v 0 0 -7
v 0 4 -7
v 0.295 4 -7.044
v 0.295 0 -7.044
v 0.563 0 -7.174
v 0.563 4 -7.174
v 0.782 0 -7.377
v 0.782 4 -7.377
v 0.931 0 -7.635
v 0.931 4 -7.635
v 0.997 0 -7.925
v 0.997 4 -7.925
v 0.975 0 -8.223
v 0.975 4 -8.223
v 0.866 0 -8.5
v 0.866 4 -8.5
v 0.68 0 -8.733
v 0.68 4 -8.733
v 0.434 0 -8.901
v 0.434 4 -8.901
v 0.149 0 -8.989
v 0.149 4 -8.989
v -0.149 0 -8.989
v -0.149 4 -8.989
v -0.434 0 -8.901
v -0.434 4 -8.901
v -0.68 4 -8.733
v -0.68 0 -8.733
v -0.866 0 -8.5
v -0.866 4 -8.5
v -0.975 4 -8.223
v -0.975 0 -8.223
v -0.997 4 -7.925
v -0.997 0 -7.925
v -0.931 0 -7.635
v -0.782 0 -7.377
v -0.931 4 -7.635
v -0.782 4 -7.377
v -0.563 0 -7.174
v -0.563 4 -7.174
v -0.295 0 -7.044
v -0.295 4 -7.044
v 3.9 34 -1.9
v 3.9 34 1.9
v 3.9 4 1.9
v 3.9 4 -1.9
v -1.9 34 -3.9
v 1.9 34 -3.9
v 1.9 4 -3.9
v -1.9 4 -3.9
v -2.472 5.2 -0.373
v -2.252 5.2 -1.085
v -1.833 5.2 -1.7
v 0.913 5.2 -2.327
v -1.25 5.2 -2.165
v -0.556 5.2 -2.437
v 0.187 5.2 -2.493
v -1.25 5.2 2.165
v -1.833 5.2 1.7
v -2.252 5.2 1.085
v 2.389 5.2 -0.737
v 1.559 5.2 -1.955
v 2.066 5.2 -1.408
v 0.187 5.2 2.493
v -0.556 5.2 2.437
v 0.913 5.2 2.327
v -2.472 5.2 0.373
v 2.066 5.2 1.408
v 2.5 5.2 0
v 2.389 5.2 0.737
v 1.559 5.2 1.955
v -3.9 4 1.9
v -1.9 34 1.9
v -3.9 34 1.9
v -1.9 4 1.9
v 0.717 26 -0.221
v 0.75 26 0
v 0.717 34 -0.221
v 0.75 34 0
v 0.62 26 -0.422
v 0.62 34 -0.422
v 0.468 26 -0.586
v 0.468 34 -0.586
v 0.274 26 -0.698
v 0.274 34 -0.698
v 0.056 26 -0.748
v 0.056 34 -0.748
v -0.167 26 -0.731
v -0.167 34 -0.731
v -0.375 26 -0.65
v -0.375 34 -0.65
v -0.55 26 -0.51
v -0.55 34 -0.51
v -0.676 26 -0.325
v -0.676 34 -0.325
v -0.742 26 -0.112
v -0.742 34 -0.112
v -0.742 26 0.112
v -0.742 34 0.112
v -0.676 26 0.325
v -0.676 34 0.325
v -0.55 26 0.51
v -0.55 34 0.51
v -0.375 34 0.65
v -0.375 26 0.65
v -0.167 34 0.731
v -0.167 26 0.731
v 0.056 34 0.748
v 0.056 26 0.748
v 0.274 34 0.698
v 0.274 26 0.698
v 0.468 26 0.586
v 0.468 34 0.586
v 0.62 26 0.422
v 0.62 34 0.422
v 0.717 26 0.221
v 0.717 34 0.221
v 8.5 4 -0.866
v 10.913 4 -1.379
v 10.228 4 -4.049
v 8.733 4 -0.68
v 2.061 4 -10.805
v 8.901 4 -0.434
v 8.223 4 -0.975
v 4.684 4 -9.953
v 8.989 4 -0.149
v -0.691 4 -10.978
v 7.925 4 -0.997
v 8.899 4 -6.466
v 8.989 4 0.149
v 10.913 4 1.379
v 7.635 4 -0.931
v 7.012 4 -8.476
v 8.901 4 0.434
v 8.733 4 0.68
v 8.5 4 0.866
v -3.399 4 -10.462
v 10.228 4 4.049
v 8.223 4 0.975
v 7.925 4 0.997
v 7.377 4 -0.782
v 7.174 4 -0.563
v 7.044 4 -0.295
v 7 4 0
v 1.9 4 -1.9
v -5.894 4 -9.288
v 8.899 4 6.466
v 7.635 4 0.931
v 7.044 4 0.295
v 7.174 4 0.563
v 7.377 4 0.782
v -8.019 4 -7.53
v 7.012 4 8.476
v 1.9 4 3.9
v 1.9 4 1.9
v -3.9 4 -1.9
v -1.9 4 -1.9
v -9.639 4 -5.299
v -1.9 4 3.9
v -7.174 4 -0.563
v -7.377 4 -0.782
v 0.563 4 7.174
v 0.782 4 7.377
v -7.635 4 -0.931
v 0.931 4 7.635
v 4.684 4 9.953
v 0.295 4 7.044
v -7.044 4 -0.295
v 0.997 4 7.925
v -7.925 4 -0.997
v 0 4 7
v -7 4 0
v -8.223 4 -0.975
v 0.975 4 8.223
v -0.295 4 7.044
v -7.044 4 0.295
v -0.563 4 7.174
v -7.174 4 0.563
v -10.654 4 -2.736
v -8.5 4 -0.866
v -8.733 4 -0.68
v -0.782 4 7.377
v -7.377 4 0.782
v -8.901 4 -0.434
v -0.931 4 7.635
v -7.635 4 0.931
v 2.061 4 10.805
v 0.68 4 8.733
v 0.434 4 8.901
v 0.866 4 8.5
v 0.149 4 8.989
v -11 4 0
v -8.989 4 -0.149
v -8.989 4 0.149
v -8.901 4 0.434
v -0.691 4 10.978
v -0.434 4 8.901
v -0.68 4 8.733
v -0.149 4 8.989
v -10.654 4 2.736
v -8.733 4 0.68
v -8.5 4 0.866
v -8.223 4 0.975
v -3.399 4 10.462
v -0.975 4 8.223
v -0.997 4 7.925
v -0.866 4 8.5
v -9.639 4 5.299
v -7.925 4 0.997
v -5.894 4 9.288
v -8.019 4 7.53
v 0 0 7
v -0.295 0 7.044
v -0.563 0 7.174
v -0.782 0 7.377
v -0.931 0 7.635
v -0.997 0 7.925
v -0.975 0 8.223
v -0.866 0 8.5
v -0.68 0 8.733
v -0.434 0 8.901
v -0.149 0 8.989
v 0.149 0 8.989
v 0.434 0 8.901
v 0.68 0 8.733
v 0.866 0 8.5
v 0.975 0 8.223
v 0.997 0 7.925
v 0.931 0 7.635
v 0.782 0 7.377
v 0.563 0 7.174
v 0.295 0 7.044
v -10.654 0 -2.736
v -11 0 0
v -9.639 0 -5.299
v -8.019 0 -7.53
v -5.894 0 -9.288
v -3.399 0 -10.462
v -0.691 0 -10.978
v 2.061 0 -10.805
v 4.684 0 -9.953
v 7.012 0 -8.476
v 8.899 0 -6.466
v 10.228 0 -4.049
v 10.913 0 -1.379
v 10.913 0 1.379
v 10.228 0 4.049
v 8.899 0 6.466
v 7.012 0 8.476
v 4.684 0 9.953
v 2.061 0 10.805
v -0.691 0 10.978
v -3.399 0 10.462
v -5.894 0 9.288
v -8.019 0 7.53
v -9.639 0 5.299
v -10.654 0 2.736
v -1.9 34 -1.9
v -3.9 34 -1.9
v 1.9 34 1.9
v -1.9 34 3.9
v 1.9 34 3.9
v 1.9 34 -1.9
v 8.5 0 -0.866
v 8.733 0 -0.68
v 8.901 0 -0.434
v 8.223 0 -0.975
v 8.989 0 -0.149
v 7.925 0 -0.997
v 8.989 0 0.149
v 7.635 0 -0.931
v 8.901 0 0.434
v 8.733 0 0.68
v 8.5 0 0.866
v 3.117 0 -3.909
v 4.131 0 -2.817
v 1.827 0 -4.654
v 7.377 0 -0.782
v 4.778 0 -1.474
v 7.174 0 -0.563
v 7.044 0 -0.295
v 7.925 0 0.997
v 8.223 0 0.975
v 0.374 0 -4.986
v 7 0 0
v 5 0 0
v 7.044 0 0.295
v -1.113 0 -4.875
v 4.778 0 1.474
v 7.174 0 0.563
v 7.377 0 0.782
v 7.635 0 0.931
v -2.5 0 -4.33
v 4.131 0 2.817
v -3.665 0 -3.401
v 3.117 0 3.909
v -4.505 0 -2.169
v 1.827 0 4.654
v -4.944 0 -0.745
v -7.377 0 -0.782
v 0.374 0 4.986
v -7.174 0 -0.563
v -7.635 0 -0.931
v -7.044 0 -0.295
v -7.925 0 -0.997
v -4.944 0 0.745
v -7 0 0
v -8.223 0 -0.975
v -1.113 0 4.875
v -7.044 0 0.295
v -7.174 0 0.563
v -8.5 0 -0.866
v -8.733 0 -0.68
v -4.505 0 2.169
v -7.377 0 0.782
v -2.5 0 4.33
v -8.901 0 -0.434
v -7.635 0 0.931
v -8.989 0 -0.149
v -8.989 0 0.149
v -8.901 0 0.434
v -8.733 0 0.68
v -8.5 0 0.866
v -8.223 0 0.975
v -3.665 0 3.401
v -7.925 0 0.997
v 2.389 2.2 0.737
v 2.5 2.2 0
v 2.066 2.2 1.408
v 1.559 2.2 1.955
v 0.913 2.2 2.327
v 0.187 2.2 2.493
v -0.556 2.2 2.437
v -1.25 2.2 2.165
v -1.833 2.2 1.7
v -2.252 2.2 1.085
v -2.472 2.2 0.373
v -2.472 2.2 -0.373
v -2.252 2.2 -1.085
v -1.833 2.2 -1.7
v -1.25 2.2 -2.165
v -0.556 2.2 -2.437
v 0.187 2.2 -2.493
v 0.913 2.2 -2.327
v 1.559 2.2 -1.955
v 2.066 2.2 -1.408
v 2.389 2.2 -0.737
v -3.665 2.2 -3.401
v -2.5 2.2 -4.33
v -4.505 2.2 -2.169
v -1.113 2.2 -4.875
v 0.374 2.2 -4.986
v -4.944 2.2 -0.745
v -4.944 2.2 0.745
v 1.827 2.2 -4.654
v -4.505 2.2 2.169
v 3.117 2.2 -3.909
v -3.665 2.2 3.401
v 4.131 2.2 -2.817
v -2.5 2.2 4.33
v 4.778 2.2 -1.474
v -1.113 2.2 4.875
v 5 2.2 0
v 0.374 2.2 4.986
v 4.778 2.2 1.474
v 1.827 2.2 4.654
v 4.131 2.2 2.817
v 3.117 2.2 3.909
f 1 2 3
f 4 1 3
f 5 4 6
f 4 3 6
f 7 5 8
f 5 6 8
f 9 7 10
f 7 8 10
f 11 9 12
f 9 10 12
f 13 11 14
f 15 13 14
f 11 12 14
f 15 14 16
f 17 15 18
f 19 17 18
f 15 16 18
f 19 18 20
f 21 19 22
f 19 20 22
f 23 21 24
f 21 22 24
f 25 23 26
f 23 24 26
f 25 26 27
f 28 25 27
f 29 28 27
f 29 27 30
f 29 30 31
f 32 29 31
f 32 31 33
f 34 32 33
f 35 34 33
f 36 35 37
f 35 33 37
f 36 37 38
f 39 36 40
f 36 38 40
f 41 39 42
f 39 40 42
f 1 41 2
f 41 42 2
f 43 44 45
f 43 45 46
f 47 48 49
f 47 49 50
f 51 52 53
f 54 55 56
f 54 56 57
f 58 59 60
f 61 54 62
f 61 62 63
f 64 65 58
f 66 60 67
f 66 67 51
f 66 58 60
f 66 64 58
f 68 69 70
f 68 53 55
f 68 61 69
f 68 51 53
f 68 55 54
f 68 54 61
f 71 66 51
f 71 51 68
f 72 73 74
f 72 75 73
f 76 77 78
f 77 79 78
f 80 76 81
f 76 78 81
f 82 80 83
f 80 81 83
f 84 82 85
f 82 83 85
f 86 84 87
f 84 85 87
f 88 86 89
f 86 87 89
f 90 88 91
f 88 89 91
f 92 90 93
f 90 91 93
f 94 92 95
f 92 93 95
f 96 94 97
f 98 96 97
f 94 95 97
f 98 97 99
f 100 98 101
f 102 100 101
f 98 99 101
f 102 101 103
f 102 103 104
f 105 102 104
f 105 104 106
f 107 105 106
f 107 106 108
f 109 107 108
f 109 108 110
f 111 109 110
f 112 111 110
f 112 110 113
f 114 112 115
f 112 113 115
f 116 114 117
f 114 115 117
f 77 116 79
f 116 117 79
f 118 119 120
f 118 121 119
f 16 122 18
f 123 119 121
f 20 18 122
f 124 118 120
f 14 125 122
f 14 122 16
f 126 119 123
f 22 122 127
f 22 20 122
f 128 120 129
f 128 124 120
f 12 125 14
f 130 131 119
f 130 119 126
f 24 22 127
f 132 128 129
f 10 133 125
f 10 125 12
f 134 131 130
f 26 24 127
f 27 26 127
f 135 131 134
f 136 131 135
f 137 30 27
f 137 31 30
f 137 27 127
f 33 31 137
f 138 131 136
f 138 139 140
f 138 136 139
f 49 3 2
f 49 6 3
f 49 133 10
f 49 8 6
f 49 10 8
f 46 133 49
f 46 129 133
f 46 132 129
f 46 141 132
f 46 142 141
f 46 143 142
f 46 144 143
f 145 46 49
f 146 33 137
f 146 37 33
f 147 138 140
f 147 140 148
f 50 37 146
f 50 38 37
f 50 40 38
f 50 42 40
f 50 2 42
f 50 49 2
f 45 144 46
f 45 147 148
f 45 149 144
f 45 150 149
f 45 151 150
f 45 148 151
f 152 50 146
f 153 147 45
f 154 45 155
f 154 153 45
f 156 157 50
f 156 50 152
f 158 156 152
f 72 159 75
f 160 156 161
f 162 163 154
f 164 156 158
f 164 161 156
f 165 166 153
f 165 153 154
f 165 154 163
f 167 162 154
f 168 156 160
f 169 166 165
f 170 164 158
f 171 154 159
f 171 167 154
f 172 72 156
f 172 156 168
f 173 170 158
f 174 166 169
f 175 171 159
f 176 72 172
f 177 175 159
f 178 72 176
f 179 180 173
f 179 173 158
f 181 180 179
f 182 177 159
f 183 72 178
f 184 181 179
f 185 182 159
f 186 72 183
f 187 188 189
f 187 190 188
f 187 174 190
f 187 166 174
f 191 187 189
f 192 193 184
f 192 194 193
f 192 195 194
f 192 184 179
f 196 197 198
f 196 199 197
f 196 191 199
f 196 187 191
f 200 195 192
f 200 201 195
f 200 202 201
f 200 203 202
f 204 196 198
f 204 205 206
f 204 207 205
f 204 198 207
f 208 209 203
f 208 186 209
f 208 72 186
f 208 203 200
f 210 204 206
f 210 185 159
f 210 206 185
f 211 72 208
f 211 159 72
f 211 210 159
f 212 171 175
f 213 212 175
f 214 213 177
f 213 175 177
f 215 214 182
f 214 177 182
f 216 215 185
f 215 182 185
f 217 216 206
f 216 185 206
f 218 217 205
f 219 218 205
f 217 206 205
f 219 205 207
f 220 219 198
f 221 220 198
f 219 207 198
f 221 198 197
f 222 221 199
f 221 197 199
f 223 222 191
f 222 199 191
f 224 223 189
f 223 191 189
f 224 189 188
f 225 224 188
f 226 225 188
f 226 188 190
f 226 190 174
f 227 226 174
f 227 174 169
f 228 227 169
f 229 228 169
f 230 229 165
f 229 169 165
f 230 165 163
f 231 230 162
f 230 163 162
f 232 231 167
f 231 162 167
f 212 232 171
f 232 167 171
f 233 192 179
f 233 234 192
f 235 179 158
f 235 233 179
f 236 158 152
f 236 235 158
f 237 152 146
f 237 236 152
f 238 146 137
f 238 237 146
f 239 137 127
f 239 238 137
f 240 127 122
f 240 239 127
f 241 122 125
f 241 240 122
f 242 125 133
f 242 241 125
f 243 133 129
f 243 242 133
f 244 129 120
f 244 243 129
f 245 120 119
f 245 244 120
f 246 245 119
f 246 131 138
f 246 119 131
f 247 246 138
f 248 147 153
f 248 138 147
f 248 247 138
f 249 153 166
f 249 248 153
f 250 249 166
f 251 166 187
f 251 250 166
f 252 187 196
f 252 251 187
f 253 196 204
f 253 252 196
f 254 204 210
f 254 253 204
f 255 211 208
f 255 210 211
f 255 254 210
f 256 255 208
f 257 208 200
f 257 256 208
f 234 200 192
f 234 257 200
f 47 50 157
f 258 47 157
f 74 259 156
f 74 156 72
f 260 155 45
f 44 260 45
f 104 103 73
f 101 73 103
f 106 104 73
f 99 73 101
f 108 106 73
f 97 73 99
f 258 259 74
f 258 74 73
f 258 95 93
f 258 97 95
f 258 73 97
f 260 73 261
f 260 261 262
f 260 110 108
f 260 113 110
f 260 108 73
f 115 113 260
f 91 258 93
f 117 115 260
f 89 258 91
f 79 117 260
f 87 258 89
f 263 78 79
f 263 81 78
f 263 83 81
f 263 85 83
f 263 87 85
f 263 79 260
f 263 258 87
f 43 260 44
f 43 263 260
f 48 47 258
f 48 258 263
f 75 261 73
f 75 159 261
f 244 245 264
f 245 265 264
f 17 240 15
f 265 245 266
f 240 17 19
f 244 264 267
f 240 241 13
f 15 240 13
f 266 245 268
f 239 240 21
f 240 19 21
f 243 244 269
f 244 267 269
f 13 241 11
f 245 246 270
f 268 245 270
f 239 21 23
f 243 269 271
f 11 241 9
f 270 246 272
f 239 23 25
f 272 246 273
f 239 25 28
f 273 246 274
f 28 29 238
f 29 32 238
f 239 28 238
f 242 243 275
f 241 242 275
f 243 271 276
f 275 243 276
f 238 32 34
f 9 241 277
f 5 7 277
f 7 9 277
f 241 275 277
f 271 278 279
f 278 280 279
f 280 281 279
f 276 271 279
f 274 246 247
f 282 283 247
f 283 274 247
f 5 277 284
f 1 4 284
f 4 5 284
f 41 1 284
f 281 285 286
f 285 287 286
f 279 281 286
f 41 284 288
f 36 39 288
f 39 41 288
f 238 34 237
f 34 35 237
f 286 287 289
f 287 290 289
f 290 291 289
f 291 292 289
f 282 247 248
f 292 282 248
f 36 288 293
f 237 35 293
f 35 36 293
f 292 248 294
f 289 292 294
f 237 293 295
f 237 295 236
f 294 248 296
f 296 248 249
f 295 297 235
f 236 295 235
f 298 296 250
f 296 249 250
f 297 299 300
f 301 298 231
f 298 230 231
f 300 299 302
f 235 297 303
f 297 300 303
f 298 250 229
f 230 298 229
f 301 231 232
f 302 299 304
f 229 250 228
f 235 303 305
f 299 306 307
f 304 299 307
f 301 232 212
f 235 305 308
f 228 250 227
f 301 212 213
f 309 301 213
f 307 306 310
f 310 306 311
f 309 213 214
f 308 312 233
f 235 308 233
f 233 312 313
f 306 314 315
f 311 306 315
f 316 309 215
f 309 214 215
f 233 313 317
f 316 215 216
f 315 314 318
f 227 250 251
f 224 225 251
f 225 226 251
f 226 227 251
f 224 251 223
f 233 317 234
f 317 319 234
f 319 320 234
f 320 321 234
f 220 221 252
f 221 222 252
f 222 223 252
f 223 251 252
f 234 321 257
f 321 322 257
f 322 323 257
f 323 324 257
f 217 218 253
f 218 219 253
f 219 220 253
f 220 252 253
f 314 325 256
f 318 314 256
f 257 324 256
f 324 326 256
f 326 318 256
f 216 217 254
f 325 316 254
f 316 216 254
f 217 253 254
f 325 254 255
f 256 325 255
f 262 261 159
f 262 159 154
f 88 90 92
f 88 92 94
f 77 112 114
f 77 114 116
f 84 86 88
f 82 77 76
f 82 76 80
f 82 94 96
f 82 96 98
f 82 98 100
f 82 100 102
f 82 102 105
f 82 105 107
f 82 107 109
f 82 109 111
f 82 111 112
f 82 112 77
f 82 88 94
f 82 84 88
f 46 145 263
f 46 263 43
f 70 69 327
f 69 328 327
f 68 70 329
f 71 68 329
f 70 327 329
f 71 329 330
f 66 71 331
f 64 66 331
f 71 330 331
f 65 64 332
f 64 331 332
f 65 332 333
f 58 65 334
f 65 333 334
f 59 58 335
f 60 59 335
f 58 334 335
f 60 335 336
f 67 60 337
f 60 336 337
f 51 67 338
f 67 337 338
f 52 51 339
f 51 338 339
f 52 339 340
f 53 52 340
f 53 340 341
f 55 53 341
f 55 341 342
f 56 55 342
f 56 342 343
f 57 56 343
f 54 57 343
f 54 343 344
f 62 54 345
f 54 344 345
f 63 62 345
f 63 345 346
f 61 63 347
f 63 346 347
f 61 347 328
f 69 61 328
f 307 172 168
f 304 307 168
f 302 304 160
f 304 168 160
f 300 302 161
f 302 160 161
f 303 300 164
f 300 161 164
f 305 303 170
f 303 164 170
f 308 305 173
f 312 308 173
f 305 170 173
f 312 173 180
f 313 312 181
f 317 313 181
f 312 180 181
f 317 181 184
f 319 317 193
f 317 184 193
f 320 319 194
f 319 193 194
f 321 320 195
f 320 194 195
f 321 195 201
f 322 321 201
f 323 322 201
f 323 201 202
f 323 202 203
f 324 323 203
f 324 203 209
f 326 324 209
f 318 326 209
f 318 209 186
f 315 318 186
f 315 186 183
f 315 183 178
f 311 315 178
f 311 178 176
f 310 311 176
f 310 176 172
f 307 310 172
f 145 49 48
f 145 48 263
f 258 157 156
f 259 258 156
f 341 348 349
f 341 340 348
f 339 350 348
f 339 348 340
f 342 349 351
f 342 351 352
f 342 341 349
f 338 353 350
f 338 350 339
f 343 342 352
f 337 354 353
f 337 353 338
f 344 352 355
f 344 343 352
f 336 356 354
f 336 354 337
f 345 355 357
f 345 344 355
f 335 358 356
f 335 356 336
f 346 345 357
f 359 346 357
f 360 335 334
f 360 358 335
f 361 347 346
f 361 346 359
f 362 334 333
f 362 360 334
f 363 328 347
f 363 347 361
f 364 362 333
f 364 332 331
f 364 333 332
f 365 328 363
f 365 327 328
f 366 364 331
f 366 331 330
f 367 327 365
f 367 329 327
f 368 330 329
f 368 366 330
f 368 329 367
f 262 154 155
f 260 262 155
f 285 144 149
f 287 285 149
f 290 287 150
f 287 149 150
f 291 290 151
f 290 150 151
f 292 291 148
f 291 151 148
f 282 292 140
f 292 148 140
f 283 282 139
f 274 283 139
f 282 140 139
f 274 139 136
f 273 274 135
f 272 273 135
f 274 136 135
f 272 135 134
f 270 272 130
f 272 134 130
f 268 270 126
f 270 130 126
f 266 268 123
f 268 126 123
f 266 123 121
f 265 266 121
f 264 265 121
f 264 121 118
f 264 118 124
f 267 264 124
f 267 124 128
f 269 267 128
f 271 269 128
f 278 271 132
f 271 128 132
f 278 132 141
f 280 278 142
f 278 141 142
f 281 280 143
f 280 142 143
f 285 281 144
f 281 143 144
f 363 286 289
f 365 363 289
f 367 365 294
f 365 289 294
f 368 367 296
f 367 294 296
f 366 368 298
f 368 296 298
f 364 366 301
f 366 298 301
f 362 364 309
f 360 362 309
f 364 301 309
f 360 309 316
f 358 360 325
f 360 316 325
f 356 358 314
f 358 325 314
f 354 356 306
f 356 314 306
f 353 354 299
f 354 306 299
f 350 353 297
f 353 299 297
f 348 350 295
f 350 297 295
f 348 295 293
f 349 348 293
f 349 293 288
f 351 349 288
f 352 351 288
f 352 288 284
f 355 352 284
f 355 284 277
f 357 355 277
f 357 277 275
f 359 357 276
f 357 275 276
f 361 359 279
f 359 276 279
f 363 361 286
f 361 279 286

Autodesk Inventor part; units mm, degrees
ref_plane "YZ Plane" through (0, 0, 0) normal (1, 0, 0) x (0, 1, 0)
ref_plane "XZ Plane" through (0, 0, 0) normal (0, 1, 0) x (-1, 0, 0)
ref_plane "XY Plane" through (0, 0, 0) normal (0, 0, 1) x (1, 0, 0)
sketch "Sketch1" plane through (0, 0, 0) normal (0, 1, 0) x (-1, 0, 0)
  circle A0 centre (0, 0) radius 11
  dimension "d0" = 22
extrude "Extrusion1" add sketch "Sketch1" along normal blind 4
sketch "Sketch2" plane through (0, 4, 0) normal (0, 1, 0) x (1, 0, 0)
  circle A0 centre (-8, 0) radius 1
  point P0 (0, 0)
  dimension "d3" = 2
  dimension "d4" = 8
extrude "Extrusion2" cut sketch "Sketch2" against normal blind 10
pattern_circular "Circular Pattern1" count 4 over 360 about axis through (0, -10, 0) along (0, 1, 0) of "Extrusion2"
sketch "Sketch3" plane through (0, 4, 0) normal (0, 1, 0) x (1, 0, 0)
  line L0 (3.9, 3.9) -> (-3.9, 3.9)
  line L1 (-3.9, 3.9) -> (-3.9, -3.9)
  line L2 (-3.9, -3.9) -> (3.9, -3.9)
  line L3 (3.9, -3.9) -> (3.9, 3.9)
  line L4 (3.9, 3.9) -> (-3.9, -3.9) construction
  line L5 (-3.9, 3.9) -> (3.9, -3.9) construction
  line L6 (-3.9, -3.9) -> (-1.9, -3.9)
  line L7 (-1.9, -3.9) -> (-1.9, -1.9)
  line L8 (-1.9, -1.9) -> (-3.9, -1.9)
  line L9 (-3.9, -1.9) -> (-3.9, -3.9)
  line L10 (-3.9, 3.9) -> (-1.9, 3.9)
  line L11 (-1.9, 3.9) -> (-1.9, 1.9)
  line L12 (-1.9, 1.9) -> (-3.9, 1.9)
  line L13 (-3.9, 1.9) -> (-3.9, 3.9)
  line L14 (3.9, -3.9) -> (1.9, -3.9)
  line L15 (1.9, -3.9) -> (1.9, -1.9)
  line L16 (1.9, -1.9) -> (3.9, -1.9)
  line L17 (3.9, -1.9) -> (3.9, -3.9)
  line L18 (3.9, 3.9) -> (1.9, 3.9)
  line L19 (1.9, 3.9) -> (1.9, 1.9)
  line L20 (1.9, 1.9) -> (3.9, 1.9)
  line L21 (3.9, 1.9) -> (3.9, 3.9)
  point P0 (0, 0)
  point P1 (3.9, 1.9)
  point P2 (1.9, 3.9)
  point P3 (-1.9, 3.9)
  point P4 (-1.9, -3.9)
  point P5 (1.9, -3.9)
  dimension "d10" = 7.8
  dimension "d11" = 7.8
  dimension "d14" = 2
  dimension "d15" = 2
extrude "Extrusion3" add sketch "Sketch3" along normal blind 30 contours L19 L20 L3 L16 L15 L2 L7 L8 L1 L12 L11 L0
sketch "Sketch4" plane through (0, 34, 0) normal (0, 1, 0) x (1, 0, 0)
  circle A0 centre (0, 0) radius 0.75
  dimension "d16" = 1.5
extrude "Extrusion4" cut sketch "Sketch4" against normal blind 8
sketch "Sketch5" plane through (0, 0, 0) normal (0, -1, 0) x (1, 0, 0)
  circle A0 centre (0, 0) radius 0.75 projected
  circle A1 centre (0, 0) radius 5
  dimension "d19" = 10
extrude "Extrusion5" cut sketch "Sketch5" against normal blind 2.2 contours A0 | A1
sketch "Sketch6" plane through (0, 2.2, 0) normal (0, -1, 0) x (1, 0, 0)
  circle A0 centre (0, 0) radius 2.5
  dimension "d22" = 5
extrude "Extrusion6" cut sketch "Sketch6" against normal blind 3
properties part number "XM430_motor_adaptor"
